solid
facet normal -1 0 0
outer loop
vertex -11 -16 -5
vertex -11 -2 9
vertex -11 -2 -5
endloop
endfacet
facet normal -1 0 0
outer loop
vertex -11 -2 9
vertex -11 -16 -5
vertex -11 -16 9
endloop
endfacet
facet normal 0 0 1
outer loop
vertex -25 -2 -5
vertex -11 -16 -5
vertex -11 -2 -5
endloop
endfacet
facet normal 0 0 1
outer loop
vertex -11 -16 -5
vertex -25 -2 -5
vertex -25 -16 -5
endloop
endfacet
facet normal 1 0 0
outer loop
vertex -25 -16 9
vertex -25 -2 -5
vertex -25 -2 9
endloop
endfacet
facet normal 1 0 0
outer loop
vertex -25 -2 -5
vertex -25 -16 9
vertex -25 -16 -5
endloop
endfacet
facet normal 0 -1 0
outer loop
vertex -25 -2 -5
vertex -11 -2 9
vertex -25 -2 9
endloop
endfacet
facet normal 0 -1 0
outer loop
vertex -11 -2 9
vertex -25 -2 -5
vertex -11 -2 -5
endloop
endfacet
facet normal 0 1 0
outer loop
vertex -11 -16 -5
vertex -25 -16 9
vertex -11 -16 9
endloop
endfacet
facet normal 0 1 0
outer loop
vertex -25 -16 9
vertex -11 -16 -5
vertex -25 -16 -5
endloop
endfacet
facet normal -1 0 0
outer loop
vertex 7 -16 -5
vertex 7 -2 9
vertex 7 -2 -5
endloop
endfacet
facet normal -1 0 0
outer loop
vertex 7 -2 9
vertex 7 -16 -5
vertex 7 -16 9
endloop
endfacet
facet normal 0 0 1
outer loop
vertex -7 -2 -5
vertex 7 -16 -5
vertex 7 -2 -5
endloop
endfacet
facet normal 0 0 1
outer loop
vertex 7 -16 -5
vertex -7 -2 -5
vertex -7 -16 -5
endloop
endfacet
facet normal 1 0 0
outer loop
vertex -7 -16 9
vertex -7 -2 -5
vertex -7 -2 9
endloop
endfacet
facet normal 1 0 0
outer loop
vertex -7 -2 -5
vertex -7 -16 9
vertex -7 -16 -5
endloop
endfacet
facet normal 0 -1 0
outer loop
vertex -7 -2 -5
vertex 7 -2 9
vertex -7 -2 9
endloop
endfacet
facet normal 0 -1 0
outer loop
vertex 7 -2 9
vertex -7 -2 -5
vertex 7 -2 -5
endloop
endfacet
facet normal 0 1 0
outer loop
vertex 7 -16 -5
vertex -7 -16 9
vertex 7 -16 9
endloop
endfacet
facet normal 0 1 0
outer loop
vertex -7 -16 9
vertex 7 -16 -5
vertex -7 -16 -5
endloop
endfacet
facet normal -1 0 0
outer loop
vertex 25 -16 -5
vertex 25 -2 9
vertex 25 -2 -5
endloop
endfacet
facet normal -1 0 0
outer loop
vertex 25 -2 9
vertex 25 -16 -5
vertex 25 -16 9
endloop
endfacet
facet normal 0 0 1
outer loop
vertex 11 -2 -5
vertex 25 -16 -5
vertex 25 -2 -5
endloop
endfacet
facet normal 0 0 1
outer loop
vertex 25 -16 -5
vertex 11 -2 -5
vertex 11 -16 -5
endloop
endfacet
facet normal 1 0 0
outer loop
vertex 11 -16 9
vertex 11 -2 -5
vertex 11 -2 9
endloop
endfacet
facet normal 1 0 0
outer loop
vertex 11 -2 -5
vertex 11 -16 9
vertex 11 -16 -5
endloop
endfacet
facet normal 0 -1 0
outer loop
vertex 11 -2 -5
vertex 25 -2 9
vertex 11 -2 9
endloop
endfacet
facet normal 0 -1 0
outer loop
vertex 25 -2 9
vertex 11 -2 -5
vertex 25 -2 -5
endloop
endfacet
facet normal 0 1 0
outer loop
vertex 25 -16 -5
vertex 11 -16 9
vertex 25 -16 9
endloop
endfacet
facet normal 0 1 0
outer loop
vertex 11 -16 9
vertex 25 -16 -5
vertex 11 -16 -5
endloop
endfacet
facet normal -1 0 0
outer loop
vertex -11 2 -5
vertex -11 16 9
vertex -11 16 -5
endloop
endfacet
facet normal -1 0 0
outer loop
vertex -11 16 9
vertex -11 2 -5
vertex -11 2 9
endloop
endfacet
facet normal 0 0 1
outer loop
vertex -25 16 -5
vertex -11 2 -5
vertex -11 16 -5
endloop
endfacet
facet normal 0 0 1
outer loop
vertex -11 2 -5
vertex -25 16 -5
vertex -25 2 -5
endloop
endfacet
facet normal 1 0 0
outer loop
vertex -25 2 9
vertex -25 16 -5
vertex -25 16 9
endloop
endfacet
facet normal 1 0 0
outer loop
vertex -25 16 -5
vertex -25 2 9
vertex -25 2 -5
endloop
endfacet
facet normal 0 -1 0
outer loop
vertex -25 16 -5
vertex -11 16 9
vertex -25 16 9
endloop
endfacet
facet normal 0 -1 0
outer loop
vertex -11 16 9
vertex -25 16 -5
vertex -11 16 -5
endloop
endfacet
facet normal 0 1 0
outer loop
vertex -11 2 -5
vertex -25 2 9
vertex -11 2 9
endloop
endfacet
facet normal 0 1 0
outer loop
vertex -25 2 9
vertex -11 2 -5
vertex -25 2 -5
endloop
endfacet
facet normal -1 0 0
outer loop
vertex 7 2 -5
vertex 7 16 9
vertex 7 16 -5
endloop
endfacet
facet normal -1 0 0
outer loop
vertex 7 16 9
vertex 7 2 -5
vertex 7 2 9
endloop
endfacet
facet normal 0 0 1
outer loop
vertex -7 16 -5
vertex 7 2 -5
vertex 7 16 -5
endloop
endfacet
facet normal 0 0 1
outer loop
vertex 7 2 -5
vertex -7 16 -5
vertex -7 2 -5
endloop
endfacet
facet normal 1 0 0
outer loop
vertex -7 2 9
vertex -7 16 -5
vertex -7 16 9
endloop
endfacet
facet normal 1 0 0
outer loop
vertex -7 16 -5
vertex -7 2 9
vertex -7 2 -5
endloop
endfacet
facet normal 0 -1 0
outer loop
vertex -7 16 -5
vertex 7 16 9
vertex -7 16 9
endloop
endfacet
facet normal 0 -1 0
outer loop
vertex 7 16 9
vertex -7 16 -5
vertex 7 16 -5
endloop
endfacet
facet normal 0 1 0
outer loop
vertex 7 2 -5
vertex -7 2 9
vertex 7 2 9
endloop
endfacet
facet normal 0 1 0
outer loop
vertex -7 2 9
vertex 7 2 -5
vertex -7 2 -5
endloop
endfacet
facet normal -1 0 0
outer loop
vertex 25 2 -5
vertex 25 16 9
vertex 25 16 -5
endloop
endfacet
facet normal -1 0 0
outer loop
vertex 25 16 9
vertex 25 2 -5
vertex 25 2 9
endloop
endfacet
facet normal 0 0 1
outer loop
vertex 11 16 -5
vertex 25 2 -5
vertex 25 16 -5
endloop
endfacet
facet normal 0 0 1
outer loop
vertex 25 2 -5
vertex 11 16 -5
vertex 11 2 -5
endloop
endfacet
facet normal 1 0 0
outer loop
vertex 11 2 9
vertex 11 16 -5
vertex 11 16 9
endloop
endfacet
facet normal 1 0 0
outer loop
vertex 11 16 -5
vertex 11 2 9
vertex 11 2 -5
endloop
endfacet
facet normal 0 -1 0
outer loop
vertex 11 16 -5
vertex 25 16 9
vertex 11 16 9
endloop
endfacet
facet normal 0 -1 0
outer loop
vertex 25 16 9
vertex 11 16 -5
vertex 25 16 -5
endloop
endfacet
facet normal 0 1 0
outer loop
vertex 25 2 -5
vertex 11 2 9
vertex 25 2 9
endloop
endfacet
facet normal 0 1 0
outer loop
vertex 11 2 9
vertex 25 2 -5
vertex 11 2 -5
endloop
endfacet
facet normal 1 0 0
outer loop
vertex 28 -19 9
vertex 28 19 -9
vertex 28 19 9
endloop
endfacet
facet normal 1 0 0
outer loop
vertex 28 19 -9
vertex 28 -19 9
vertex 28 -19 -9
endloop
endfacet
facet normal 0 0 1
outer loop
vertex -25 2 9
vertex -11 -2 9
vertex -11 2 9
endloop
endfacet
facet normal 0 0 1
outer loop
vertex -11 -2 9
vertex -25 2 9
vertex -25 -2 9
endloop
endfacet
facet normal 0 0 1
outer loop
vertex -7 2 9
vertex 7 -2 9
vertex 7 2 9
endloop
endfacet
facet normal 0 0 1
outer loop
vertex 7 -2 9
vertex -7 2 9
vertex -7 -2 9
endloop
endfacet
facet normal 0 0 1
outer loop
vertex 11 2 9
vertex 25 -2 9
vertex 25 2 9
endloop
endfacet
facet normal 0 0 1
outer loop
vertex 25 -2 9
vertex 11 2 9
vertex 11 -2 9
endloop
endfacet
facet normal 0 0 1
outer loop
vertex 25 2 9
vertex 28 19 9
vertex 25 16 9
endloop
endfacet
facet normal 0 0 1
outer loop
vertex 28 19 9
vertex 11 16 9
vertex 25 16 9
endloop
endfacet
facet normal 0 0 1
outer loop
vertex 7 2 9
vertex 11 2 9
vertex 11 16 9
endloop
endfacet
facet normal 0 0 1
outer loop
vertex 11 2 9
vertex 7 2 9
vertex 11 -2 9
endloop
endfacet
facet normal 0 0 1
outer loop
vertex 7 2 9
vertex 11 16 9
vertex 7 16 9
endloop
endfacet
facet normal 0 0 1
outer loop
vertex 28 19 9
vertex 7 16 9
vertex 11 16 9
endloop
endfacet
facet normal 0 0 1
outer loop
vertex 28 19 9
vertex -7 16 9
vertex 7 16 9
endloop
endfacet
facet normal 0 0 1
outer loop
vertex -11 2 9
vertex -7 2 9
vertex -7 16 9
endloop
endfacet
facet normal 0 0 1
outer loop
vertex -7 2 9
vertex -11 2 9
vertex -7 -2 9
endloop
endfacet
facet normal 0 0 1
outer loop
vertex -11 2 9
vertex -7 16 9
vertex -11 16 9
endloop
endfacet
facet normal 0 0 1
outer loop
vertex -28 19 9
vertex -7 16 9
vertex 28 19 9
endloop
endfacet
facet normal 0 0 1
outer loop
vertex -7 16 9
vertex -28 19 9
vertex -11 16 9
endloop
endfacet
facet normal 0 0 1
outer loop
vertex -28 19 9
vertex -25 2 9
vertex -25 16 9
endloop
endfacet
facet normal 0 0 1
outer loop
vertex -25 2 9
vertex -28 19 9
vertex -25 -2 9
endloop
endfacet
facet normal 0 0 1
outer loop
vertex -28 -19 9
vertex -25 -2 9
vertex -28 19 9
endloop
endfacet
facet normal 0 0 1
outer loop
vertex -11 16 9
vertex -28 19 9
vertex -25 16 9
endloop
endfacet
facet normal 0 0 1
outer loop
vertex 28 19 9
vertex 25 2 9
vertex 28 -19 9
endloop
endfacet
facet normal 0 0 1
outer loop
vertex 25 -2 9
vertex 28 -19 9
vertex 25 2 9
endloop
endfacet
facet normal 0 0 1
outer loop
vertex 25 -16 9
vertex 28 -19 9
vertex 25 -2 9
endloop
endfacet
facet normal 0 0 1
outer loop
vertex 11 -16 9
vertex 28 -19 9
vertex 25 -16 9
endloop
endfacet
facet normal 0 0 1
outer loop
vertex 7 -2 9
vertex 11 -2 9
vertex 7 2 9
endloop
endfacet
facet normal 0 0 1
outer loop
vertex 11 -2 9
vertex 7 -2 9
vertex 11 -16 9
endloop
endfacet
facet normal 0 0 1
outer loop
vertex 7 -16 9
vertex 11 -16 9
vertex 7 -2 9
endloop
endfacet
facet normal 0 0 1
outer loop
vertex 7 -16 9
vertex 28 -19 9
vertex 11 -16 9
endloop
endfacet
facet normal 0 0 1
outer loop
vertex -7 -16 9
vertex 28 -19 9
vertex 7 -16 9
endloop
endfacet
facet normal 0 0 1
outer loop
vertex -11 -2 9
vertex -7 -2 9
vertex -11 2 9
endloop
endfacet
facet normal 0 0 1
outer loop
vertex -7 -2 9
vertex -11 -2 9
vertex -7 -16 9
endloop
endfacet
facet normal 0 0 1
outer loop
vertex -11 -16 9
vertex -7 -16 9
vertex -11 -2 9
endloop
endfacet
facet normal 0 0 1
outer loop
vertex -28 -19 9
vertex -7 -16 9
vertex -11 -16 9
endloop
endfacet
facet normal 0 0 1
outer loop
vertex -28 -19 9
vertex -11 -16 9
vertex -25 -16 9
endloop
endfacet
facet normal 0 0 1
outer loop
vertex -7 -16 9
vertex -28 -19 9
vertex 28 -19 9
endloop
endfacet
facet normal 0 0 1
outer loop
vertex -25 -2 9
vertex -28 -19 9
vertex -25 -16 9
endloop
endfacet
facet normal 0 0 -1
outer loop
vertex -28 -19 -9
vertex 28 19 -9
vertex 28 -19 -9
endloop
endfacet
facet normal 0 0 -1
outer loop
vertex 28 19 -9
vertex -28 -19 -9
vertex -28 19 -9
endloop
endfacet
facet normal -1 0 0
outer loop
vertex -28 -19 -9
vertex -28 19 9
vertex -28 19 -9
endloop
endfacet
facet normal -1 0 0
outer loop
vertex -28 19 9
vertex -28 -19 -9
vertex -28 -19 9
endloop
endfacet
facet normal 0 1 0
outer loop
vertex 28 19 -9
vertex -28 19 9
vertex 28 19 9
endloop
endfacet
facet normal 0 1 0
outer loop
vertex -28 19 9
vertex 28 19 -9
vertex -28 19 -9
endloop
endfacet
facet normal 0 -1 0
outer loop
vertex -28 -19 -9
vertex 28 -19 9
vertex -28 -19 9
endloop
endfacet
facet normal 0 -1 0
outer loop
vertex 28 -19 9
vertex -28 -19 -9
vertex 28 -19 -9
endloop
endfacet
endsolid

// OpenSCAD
$fn = 32;

// ----------------------------------------------------------------------
// Pocket plate 56 x 38 x 18
// 2 x 3 pockets 14 mm square, 14 mm deep
// ----------------------------------------------------------------------

// --- parameters (mm) ---
thickness = 18;  // plate thickness
floor_t = 4;     // material left under each pocket
pocket = 14;     // pocket side length
pitch_x = 18;    // pocket pitch along X
pitch_y = 18;    // pocket pitch along Y
cols = 3;        // pockets per row
rows = 2;        // rows of pockets

// --- derived feature positions (mm) ---
depth = thickness - floor_t;        // = 14   pocket depth, down to the floor
span_x = (cols - 1) * pitch_x;      // = 36   distance between outer pockets
span_y = (rows - 1) * pitch_y;      // = 18   distance between outer pocket rows
origin_x = -span_x / 2;             // = -18   X of the first pocket
origin_y = -span_y / 2;             // = -9   Y of the first pocket
plate = [span_x + pocket + 6, span_y + pocket + 6, thickness];  // = [56, 38, 18]   overall size: pockets plus 3 mm of wall on each side
feature_centers = [
  [origin_x + 0 * pitch_x, origin_y + 0 * pitch_y],
  [origin_x + 1 * pitch_x, origin_y + 0 * pitch_y],
  [origin_x + 2 * pitch_x, origin_y + 0 * pitch_y],
  [origin_x + 0 * pitch_x, origin_y + 1 * pitch_y],
  [origin_x + 1 * pitch_x, origin_y + 1 * pitch_y],
  [origin_x + 2 * pitch_x, origin_y + 1 * pitch_y]
];   // pocket centres, used verbatim by the cutter loop

// plate outline, then one pocket per centre in feature_centers
difference() {
  cube(plate, center = true);
  for (centre = feature_centers)
    translate([centre[0] - pocket / 2, centre[1] - pocket / 2, plate[2] / 2 - depth])
      cube([pocket, pocket, depth + 1]);  // centred on the declared pocket centre
}
